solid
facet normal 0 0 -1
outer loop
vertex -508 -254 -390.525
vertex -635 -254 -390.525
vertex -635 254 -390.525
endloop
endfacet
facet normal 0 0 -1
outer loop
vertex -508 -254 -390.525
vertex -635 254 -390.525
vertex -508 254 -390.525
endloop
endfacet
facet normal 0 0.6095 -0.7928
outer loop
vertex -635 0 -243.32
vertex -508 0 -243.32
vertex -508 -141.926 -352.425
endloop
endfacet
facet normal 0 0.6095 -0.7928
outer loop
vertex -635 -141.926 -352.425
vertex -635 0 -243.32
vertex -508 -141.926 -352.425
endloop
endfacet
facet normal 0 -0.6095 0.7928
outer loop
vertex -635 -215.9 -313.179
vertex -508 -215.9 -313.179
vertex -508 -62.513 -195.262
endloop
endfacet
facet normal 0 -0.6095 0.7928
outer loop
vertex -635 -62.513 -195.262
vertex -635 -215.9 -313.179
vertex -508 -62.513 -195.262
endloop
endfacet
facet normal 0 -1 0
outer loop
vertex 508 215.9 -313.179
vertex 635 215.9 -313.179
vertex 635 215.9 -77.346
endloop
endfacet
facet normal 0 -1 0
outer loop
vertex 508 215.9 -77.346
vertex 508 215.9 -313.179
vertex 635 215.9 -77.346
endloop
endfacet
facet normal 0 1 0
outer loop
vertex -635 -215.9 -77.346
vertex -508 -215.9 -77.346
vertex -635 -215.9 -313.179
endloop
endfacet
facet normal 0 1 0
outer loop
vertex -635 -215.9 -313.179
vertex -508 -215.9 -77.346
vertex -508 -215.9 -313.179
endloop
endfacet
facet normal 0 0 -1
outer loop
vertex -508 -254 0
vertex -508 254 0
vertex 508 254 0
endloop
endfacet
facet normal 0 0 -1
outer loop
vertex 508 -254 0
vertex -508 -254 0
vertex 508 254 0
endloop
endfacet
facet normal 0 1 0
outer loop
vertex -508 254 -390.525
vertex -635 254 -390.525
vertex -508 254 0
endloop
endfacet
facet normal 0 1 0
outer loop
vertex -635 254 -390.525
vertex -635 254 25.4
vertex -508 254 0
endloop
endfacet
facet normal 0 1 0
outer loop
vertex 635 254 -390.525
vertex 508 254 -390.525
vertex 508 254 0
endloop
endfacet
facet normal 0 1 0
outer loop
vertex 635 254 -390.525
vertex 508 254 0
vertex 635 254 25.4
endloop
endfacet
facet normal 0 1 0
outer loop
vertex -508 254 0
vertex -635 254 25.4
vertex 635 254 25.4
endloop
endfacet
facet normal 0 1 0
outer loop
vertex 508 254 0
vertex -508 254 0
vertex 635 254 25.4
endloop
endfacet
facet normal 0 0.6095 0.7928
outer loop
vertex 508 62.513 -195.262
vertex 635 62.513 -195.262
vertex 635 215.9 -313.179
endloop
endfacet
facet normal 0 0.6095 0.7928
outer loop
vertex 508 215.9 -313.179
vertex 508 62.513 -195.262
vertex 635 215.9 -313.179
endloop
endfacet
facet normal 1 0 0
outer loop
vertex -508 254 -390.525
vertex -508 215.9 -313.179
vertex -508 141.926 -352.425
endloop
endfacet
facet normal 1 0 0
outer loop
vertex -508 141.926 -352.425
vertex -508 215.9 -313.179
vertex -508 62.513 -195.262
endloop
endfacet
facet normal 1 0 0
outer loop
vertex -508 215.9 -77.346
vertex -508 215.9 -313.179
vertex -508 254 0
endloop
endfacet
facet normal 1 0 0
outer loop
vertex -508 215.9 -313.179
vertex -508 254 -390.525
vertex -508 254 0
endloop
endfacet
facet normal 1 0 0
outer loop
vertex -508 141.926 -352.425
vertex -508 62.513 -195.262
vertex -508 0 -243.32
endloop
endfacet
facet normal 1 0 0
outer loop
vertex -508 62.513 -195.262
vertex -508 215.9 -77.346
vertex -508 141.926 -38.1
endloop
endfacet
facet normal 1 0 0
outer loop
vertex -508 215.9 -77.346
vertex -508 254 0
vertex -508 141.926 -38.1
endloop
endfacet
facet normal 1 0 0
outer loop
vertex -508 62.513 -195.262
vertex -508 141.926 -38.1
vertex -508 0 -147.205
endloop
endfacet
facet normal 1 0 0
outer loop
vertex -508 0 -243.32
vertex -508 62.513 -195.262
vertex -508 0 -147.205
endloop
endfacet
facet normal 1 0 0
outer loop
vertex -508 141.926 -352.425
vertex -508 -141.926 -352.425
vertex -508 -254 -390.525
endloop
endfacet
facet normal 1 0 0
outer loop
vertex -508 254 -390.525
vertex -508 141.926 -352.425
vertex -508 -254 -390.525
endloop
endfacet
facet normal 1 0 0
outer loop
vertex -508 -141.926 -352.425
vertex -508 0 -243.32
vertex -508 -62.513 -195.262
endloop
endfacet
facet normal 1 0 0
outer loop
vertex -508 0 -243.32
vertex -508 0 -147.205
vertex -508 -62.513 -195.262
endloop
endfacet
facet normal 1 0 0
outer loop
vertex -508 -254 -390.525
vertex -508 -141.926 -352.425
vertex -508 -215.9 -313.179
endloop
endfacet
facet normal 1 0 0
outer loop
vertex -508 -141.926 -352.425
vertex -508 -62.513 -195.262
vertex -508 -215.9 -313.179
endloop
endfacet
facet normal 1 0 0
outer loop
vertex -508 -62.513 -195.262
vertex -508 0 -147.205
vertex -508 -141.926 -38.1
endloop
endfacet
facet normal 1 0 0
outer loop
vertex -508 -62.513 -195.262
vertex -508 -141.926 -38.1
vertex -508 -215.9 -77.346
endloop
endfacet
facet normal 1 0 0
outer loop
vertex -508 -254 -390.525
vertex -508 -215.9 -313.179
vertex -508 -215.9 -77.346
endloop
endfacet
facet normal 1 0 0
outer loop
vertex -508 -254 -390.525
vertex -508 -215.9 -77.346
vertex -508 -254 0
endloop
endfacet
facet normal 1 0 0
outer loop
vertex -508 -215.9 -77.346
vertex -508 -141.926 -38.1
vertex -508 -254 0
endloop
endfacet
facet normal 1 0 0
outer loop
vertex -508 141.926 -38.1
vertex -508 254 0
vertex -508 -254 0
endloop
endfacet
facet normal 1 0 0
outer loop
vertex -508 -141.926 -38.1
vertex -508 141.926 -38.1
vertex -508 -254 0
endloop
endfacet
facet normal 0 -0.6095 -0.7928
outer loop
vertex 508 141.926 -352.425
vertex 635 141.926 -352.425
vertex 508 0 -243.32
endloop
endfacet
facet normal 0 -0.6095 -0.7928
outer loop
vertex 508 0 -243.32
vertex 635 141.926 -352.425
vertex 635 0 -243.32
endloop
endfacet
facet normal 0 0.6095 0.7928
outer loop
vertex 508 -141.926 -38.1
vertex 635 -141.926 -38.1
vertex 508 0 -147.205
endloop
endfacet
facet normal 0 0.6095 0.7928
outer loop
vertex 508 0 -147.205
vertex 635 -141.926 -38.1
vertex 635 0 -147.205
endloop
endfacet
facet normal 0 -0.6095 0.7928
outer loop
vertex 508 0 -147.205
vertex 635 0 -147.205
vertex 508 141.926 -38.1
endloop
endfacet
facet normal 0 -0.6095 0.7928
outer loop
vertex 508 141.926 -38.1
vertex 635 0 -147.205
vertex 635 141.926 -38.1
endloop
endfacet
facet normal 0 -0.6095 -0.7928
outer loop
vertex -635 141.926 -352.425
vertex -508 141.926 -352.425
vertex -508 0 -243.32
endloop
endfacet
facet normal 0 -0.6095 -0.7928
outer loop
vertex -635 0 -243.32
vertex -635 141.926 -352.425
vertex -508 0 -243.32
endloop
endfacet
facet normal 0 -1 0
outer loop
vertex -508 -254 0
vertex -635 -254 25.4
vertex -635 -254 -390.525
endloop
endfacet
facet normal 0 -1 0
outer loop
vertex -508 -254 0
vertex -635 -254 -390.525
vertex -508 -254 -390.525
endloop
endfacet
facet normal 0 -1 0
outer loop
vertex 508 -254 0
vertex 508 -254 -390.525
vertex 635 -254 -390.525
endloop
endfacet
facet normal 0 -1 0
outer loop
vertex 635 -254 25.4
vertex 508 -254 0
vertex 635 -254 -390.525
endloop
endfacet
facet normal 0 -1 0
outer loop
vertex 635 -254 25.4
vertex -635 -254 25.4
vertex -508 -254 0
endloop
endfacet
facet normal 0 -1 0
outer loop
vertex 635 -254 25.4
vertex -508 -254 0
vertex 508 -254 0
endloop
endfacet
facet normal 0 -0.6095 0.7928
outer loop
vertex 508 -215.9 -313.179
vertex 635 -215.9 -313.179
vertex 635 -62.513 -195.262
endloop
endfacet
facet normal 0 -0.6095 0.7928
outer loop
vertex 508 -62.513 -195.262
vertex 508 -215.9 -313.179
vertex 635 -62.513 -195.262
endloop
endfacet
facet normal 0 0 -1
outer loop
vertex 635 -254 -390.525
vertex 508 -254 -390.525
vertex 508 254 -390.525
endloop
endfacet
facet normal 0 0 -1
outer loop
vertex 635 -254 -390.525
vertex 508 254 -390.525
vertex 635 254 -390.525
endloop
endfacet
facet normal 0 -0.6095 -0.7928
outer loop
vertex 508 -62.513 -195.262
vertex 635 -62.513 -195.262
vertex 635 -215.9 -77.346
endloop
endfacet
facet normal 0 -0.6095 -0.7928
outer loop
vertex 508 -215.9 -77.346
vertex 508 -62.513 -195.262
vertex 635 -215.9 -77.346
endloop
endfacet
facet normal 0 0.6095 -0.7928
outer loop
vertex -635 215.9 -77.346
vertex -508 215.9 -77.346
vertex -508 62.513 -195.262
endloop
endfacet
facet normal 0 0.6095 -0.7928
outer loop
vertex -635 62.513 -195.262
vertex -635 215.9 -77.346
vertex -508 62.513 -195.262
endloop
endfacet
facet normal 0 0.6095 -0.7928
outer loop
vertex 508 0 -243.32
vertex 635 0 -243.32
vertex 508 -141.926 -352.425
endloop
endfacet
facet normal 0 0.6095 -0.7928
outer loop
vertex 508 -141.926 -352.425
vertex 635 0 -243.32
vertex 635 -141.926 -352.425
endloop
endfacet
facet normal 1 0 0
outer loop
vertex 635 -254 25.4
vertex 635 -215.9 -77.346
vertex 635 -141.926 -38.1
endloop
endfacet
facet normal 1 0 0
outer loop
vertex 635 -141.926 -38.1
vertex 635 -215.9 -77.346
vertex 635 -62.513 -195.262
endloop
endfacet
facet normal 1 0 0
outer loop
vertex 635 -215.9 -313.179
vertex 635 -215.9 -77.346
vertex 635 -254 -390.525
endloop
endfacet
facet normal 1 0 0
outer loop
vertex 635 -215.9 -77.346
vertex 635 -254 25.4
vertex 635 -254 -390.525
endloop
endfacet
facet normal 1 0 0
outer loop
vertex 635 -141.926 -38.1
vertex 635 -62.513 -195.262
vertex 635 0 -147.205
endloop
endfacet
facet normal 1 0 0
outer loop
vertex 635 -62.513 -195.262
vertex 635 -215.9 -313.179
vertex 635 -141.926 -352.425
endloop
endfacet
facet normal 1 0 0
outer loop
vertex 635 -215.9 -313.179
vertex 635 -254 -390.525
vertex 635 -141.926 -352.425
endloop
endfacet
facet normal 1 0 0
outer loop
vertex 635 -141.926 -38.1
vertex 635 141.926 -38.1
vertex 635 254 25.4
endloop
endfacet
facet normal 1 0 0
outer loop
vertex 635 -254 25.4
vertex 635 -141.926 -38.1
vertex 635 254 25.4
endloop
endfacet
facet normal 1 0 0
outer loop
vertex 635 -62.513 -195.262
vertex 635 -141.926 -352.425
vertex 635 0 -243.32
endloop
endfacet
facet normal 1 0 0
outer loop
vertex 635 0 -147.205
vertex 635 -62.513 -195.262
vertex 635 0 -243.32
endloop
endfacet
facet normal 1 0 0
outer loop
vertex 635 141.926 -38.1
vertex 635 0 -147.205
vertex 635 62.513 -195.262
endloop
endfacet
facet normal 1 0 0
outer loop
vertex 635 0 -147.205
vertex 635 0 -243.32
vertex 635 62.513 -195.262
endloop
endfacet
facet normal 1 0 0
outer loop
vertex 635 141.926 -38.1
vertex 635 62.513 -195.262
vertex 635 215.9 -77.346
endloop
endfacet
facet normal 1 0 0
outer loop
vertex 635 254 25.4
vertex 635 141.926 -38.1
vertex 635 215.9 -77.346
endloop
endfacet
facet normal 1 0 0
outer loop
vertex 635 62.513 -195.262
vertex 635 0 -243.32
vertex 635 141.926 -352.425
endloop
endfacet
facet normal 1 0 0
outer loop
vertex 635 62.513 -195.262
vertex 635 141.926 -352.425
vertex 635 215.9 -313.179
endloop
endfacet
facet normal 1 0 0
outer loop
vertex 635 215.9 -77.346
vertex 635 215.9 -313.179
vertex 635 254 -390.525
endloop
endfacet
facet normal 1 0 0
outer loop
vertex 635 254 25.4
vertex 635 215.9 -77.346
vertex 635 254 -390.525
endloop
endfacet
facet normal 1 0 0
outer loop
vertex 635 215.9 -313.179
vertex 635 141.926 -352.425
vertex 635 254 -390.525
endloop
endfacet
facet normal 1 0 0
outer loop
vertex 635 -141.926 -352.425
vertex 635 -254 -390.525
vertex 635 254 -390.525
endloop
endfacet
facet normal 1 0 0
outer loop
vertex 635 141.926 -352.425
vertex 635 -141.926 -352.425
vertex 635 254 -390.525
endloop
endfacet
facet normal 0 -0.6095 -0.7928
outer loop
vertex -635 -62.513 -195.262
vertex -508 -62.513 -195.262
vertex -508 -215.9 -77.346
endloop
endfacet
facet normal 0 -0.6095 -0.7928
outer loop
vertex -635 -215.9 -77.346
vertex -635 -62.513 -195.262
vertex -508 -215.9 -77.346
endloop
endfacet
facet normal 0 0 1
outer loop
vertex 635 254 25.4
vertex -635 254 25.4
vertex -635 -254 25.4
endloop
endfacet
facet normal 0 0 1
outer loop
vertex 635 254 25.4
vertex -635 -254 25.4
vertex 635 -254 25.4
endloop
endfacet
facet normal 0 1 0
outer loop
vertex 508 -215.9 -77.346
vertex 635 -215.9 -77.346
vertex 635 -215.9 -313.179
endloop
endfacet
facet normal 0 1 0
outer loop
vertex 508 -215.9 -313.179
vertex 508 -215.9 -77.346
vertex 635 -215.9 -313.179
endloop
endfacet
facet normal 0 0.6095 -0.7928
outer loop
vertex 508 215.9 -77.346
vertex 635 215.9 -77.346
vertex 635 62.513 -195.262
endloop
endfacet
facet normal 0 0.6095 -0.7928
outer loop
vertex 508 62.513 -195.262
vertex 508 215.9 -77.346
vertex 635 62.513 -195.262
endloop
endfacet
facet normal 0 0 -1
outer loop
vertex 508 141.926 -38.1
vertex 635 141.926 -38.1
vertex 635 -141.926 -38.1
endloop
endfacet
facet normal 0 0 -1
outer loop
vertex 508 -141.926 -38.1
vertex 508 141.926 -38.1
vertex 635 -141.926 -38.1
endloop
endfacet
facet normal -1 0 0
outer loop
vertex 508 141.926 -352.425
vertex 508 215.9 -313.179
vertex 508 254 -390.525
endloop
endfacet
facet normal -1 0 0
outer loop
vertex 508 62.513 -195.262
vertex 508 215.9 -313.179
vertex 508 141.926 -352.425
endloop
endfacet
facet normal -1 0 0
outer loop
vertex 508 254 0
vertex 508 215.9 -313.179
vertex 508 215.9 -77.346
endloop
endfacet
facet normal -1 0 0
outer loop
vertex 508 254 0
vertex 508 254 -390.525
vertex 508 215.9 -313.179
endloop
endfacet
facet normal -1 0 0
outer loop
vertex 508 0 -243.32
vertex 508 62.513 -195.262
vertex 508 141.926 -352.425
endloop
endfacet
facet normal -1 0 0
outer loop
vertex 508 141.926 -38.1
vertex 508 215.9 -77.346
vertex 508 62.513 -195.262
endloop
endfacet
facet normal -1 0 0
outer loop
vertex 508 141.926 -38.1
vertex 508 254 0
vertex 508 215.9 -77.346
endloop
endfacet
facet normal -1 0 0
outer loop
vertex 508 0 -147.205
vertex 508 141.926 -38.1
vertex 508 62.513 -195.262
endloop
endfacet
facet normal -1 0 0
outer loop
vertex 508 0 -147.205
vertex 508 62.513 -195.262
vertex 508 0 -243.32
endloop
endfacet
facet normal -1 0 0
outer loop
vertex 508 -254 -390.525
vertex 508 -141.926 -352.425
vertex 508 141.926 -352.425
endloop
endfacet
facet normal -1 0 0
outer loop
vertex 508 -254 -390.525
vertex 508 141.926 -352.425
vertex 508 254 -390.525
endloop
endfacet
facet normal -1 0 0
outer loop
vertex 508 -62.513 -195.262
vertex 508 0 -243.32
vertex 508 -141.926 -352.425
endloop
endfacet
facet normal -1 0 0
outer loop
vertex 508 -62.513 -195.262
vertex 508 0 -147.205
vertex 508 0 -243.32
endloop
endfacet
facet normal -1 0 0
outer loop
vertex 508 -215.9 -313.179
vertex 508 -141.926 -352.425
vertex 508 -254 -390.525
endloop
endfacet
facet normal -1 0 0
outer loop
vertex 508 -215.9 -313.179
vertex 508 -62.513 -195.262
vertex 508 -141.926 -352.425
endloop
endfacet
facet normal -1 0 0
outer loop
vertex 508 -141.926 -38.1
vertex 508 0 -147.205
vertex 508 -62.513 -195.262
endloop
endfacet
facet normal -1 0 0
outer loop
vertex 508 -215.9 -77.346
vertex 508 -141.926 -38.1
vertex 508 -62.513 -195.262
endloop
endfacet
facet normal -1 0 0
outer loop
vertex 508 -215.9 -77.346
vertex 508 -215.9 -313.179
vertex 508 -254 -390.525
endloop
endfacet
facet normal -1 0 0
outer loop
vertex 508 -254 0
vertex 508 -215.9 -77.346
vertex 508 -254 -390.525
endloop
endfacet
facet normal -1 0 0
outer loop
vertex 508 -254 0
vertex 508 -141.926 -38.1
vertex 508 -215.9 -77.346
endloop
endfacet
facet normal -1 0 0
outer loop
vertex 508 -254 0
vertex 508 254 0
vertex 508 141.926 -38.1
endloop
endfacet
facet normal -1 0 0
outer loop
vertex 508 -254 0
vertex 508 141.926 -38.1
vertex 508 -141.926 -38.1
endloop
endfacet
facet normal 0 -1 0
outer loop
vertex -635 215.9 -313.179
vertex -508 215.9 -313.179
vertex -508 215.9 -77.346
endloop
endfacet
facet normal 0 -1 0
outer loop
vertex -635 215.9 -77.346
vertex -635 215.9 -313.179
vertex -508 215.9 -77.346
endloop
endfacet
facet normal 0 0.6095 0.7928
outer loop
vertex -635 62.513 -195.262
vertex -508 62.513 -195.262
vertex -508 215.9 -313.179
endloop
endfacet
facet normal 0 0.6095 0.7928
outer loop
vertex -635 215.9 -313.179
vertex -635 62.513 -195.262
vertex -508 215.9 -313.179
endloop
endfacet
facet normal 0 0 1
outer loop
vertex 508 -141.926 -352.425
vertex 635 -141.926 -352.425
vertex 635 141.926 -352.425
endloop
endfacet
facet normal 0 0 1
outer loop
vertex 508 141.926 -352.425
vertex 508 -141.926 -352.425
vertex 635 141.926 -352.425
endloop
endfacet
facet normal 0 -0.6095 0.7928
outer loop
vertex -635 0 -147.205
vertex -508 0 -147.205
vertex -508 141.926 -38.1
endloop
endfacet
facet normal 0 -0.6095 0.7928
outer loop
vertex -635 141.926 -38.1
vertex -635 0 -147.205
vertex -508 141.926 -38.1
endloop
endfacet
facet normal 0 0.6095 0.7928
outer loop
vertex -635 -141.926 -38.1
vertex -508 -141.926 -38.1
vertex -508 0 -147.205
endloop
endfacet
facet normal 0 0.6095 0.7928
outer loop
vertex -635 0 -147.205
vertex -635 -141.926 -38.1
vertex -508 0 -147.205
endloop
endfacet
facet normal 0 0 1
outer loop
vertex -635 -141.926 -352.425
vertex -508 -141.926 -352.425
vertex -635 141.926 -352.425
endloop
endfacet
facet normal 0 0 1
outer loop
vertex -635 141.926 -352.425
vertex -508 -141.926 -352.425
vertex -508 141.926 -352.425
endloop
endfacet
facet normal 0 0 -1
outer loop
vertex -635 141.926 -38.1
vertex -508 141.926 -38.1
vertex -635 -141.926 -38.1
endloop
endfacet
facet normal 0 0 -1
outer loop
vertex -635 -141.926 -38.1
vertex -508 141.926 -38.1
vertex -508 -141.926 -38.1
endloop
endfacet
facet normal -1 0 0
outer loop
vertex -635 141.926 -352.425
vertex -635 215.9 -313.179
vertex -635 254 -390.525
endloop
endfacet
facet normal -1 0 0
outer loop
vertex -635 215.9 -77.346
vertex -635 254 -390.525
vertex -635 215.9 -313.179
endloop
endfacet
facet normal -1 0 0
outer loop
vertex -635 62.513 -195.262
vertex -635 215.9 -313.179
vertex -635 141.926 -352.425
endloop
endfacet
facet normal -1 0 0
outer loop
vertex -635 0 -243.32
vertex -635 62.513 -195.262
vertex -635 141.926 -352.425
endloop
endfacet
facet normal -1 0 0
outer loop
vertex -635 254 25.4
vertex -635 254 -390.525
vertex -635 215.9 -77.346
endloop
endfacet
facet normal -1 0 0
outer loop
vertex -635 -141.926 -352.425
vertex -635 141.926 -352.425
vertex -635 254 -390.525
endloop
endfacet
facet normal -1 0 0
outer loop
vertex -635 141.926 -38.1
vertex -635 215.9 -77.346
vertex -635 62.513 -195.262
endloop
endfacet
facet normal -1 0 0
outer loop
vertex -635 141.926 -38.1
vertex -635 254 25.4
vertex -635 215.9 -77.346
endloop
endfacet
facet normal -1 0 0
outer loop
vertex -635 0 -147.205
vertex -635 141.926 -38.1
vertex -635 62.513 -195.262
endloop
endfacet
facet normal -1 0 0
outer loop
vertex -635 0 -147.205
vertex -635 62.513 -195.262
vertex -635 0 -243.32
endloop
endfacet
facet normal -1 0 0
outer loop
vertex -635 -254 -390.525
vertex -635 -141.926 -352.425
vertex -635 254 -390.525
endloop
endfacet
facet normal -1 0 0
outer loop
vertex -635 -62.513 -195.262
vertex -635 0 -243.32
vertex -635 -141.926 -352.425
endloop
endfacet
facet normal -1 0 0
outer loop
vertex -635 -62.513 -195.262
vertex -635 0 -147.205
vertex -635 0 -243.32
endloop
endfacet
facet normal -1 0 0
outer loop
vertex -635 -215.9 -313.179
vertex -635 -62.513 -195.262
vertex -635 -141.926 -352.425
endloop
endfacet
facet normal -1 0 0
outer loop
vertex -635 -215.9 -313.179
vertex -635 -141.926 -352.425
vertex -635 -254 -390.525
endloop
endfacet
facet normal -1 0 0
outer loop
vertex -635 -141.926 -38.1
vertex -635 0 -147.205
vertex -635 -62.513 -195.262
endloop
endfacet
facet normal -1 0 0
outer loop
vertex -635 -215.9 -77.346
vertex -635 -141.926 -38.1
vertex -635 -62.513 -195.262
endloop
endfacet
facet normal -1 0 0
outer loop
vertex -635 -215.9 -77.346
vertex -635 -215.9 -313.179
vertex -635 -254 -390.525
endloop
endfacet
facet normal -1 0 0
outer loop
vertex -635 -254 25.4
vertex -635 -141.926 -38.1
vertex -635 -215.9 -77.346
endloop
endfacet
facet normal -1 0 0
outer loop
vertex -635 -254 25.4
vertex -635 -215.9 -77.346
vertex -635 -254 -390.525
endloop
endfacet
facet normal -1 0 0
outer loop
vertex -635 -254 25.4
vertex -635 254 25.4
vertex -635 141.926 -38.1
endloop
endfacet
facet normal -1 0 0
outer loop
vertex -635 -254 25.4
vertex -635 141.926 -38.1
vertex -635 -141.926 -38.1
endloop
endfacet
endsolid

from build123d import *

# Parameters (mm, degrees)
F0_W     = 1270
F0_H     = 508
F1_DEPTH = 25.4
F2_W     = 127
F2_H     = 508
F3_DEPTH = 390.525
F5_DEPTH = 1270.001


with BuildPart() as f1:
    # F0 (on Top) → F1 (new body)
    with BuildSketch(Plane.XY):
        Rectangle(F0_W, F0_H)
    extrude(amount=F1_DEPTH)

    # F2 (on face) → F3 (join)
    with BuildSketch(Plane(origin=(0, 0, 0), x_dir=(1, 0, 0), z_dir=(0, 0, -1))):
        with Locations((-571.5, 0)):
            Rectangle(F2_W, F2_H)
        with Locations((571.5, 0)):
            Rectangle(F2_W, F2_H)
    extrude(amount=F3_DEPTH)

    # F4 (on face) → F5 (cut, through all)
    with BuildSketch(Plane.YZ.offset(635)):
        Polygon((0, -243.319523), (-141.925823, -352.425), (141.925823, -352.425), align=None)
        Polygon((215.9, -77.346398), (62.513201, -195.2625), (215.9, -313.178602), align=None)
        Polygon((0, -147.205477), (141.925823, -38.1), (-141.925823, -38.1), align=None)
        Polygon((-215.9, -313.178602), (-62.513201, -195.2625), (-215.9, -77.346398), align=None)
    extrude(amount=-F5_DEPTH, mode=Mode.SUBTRACT)


solid = f1.part
